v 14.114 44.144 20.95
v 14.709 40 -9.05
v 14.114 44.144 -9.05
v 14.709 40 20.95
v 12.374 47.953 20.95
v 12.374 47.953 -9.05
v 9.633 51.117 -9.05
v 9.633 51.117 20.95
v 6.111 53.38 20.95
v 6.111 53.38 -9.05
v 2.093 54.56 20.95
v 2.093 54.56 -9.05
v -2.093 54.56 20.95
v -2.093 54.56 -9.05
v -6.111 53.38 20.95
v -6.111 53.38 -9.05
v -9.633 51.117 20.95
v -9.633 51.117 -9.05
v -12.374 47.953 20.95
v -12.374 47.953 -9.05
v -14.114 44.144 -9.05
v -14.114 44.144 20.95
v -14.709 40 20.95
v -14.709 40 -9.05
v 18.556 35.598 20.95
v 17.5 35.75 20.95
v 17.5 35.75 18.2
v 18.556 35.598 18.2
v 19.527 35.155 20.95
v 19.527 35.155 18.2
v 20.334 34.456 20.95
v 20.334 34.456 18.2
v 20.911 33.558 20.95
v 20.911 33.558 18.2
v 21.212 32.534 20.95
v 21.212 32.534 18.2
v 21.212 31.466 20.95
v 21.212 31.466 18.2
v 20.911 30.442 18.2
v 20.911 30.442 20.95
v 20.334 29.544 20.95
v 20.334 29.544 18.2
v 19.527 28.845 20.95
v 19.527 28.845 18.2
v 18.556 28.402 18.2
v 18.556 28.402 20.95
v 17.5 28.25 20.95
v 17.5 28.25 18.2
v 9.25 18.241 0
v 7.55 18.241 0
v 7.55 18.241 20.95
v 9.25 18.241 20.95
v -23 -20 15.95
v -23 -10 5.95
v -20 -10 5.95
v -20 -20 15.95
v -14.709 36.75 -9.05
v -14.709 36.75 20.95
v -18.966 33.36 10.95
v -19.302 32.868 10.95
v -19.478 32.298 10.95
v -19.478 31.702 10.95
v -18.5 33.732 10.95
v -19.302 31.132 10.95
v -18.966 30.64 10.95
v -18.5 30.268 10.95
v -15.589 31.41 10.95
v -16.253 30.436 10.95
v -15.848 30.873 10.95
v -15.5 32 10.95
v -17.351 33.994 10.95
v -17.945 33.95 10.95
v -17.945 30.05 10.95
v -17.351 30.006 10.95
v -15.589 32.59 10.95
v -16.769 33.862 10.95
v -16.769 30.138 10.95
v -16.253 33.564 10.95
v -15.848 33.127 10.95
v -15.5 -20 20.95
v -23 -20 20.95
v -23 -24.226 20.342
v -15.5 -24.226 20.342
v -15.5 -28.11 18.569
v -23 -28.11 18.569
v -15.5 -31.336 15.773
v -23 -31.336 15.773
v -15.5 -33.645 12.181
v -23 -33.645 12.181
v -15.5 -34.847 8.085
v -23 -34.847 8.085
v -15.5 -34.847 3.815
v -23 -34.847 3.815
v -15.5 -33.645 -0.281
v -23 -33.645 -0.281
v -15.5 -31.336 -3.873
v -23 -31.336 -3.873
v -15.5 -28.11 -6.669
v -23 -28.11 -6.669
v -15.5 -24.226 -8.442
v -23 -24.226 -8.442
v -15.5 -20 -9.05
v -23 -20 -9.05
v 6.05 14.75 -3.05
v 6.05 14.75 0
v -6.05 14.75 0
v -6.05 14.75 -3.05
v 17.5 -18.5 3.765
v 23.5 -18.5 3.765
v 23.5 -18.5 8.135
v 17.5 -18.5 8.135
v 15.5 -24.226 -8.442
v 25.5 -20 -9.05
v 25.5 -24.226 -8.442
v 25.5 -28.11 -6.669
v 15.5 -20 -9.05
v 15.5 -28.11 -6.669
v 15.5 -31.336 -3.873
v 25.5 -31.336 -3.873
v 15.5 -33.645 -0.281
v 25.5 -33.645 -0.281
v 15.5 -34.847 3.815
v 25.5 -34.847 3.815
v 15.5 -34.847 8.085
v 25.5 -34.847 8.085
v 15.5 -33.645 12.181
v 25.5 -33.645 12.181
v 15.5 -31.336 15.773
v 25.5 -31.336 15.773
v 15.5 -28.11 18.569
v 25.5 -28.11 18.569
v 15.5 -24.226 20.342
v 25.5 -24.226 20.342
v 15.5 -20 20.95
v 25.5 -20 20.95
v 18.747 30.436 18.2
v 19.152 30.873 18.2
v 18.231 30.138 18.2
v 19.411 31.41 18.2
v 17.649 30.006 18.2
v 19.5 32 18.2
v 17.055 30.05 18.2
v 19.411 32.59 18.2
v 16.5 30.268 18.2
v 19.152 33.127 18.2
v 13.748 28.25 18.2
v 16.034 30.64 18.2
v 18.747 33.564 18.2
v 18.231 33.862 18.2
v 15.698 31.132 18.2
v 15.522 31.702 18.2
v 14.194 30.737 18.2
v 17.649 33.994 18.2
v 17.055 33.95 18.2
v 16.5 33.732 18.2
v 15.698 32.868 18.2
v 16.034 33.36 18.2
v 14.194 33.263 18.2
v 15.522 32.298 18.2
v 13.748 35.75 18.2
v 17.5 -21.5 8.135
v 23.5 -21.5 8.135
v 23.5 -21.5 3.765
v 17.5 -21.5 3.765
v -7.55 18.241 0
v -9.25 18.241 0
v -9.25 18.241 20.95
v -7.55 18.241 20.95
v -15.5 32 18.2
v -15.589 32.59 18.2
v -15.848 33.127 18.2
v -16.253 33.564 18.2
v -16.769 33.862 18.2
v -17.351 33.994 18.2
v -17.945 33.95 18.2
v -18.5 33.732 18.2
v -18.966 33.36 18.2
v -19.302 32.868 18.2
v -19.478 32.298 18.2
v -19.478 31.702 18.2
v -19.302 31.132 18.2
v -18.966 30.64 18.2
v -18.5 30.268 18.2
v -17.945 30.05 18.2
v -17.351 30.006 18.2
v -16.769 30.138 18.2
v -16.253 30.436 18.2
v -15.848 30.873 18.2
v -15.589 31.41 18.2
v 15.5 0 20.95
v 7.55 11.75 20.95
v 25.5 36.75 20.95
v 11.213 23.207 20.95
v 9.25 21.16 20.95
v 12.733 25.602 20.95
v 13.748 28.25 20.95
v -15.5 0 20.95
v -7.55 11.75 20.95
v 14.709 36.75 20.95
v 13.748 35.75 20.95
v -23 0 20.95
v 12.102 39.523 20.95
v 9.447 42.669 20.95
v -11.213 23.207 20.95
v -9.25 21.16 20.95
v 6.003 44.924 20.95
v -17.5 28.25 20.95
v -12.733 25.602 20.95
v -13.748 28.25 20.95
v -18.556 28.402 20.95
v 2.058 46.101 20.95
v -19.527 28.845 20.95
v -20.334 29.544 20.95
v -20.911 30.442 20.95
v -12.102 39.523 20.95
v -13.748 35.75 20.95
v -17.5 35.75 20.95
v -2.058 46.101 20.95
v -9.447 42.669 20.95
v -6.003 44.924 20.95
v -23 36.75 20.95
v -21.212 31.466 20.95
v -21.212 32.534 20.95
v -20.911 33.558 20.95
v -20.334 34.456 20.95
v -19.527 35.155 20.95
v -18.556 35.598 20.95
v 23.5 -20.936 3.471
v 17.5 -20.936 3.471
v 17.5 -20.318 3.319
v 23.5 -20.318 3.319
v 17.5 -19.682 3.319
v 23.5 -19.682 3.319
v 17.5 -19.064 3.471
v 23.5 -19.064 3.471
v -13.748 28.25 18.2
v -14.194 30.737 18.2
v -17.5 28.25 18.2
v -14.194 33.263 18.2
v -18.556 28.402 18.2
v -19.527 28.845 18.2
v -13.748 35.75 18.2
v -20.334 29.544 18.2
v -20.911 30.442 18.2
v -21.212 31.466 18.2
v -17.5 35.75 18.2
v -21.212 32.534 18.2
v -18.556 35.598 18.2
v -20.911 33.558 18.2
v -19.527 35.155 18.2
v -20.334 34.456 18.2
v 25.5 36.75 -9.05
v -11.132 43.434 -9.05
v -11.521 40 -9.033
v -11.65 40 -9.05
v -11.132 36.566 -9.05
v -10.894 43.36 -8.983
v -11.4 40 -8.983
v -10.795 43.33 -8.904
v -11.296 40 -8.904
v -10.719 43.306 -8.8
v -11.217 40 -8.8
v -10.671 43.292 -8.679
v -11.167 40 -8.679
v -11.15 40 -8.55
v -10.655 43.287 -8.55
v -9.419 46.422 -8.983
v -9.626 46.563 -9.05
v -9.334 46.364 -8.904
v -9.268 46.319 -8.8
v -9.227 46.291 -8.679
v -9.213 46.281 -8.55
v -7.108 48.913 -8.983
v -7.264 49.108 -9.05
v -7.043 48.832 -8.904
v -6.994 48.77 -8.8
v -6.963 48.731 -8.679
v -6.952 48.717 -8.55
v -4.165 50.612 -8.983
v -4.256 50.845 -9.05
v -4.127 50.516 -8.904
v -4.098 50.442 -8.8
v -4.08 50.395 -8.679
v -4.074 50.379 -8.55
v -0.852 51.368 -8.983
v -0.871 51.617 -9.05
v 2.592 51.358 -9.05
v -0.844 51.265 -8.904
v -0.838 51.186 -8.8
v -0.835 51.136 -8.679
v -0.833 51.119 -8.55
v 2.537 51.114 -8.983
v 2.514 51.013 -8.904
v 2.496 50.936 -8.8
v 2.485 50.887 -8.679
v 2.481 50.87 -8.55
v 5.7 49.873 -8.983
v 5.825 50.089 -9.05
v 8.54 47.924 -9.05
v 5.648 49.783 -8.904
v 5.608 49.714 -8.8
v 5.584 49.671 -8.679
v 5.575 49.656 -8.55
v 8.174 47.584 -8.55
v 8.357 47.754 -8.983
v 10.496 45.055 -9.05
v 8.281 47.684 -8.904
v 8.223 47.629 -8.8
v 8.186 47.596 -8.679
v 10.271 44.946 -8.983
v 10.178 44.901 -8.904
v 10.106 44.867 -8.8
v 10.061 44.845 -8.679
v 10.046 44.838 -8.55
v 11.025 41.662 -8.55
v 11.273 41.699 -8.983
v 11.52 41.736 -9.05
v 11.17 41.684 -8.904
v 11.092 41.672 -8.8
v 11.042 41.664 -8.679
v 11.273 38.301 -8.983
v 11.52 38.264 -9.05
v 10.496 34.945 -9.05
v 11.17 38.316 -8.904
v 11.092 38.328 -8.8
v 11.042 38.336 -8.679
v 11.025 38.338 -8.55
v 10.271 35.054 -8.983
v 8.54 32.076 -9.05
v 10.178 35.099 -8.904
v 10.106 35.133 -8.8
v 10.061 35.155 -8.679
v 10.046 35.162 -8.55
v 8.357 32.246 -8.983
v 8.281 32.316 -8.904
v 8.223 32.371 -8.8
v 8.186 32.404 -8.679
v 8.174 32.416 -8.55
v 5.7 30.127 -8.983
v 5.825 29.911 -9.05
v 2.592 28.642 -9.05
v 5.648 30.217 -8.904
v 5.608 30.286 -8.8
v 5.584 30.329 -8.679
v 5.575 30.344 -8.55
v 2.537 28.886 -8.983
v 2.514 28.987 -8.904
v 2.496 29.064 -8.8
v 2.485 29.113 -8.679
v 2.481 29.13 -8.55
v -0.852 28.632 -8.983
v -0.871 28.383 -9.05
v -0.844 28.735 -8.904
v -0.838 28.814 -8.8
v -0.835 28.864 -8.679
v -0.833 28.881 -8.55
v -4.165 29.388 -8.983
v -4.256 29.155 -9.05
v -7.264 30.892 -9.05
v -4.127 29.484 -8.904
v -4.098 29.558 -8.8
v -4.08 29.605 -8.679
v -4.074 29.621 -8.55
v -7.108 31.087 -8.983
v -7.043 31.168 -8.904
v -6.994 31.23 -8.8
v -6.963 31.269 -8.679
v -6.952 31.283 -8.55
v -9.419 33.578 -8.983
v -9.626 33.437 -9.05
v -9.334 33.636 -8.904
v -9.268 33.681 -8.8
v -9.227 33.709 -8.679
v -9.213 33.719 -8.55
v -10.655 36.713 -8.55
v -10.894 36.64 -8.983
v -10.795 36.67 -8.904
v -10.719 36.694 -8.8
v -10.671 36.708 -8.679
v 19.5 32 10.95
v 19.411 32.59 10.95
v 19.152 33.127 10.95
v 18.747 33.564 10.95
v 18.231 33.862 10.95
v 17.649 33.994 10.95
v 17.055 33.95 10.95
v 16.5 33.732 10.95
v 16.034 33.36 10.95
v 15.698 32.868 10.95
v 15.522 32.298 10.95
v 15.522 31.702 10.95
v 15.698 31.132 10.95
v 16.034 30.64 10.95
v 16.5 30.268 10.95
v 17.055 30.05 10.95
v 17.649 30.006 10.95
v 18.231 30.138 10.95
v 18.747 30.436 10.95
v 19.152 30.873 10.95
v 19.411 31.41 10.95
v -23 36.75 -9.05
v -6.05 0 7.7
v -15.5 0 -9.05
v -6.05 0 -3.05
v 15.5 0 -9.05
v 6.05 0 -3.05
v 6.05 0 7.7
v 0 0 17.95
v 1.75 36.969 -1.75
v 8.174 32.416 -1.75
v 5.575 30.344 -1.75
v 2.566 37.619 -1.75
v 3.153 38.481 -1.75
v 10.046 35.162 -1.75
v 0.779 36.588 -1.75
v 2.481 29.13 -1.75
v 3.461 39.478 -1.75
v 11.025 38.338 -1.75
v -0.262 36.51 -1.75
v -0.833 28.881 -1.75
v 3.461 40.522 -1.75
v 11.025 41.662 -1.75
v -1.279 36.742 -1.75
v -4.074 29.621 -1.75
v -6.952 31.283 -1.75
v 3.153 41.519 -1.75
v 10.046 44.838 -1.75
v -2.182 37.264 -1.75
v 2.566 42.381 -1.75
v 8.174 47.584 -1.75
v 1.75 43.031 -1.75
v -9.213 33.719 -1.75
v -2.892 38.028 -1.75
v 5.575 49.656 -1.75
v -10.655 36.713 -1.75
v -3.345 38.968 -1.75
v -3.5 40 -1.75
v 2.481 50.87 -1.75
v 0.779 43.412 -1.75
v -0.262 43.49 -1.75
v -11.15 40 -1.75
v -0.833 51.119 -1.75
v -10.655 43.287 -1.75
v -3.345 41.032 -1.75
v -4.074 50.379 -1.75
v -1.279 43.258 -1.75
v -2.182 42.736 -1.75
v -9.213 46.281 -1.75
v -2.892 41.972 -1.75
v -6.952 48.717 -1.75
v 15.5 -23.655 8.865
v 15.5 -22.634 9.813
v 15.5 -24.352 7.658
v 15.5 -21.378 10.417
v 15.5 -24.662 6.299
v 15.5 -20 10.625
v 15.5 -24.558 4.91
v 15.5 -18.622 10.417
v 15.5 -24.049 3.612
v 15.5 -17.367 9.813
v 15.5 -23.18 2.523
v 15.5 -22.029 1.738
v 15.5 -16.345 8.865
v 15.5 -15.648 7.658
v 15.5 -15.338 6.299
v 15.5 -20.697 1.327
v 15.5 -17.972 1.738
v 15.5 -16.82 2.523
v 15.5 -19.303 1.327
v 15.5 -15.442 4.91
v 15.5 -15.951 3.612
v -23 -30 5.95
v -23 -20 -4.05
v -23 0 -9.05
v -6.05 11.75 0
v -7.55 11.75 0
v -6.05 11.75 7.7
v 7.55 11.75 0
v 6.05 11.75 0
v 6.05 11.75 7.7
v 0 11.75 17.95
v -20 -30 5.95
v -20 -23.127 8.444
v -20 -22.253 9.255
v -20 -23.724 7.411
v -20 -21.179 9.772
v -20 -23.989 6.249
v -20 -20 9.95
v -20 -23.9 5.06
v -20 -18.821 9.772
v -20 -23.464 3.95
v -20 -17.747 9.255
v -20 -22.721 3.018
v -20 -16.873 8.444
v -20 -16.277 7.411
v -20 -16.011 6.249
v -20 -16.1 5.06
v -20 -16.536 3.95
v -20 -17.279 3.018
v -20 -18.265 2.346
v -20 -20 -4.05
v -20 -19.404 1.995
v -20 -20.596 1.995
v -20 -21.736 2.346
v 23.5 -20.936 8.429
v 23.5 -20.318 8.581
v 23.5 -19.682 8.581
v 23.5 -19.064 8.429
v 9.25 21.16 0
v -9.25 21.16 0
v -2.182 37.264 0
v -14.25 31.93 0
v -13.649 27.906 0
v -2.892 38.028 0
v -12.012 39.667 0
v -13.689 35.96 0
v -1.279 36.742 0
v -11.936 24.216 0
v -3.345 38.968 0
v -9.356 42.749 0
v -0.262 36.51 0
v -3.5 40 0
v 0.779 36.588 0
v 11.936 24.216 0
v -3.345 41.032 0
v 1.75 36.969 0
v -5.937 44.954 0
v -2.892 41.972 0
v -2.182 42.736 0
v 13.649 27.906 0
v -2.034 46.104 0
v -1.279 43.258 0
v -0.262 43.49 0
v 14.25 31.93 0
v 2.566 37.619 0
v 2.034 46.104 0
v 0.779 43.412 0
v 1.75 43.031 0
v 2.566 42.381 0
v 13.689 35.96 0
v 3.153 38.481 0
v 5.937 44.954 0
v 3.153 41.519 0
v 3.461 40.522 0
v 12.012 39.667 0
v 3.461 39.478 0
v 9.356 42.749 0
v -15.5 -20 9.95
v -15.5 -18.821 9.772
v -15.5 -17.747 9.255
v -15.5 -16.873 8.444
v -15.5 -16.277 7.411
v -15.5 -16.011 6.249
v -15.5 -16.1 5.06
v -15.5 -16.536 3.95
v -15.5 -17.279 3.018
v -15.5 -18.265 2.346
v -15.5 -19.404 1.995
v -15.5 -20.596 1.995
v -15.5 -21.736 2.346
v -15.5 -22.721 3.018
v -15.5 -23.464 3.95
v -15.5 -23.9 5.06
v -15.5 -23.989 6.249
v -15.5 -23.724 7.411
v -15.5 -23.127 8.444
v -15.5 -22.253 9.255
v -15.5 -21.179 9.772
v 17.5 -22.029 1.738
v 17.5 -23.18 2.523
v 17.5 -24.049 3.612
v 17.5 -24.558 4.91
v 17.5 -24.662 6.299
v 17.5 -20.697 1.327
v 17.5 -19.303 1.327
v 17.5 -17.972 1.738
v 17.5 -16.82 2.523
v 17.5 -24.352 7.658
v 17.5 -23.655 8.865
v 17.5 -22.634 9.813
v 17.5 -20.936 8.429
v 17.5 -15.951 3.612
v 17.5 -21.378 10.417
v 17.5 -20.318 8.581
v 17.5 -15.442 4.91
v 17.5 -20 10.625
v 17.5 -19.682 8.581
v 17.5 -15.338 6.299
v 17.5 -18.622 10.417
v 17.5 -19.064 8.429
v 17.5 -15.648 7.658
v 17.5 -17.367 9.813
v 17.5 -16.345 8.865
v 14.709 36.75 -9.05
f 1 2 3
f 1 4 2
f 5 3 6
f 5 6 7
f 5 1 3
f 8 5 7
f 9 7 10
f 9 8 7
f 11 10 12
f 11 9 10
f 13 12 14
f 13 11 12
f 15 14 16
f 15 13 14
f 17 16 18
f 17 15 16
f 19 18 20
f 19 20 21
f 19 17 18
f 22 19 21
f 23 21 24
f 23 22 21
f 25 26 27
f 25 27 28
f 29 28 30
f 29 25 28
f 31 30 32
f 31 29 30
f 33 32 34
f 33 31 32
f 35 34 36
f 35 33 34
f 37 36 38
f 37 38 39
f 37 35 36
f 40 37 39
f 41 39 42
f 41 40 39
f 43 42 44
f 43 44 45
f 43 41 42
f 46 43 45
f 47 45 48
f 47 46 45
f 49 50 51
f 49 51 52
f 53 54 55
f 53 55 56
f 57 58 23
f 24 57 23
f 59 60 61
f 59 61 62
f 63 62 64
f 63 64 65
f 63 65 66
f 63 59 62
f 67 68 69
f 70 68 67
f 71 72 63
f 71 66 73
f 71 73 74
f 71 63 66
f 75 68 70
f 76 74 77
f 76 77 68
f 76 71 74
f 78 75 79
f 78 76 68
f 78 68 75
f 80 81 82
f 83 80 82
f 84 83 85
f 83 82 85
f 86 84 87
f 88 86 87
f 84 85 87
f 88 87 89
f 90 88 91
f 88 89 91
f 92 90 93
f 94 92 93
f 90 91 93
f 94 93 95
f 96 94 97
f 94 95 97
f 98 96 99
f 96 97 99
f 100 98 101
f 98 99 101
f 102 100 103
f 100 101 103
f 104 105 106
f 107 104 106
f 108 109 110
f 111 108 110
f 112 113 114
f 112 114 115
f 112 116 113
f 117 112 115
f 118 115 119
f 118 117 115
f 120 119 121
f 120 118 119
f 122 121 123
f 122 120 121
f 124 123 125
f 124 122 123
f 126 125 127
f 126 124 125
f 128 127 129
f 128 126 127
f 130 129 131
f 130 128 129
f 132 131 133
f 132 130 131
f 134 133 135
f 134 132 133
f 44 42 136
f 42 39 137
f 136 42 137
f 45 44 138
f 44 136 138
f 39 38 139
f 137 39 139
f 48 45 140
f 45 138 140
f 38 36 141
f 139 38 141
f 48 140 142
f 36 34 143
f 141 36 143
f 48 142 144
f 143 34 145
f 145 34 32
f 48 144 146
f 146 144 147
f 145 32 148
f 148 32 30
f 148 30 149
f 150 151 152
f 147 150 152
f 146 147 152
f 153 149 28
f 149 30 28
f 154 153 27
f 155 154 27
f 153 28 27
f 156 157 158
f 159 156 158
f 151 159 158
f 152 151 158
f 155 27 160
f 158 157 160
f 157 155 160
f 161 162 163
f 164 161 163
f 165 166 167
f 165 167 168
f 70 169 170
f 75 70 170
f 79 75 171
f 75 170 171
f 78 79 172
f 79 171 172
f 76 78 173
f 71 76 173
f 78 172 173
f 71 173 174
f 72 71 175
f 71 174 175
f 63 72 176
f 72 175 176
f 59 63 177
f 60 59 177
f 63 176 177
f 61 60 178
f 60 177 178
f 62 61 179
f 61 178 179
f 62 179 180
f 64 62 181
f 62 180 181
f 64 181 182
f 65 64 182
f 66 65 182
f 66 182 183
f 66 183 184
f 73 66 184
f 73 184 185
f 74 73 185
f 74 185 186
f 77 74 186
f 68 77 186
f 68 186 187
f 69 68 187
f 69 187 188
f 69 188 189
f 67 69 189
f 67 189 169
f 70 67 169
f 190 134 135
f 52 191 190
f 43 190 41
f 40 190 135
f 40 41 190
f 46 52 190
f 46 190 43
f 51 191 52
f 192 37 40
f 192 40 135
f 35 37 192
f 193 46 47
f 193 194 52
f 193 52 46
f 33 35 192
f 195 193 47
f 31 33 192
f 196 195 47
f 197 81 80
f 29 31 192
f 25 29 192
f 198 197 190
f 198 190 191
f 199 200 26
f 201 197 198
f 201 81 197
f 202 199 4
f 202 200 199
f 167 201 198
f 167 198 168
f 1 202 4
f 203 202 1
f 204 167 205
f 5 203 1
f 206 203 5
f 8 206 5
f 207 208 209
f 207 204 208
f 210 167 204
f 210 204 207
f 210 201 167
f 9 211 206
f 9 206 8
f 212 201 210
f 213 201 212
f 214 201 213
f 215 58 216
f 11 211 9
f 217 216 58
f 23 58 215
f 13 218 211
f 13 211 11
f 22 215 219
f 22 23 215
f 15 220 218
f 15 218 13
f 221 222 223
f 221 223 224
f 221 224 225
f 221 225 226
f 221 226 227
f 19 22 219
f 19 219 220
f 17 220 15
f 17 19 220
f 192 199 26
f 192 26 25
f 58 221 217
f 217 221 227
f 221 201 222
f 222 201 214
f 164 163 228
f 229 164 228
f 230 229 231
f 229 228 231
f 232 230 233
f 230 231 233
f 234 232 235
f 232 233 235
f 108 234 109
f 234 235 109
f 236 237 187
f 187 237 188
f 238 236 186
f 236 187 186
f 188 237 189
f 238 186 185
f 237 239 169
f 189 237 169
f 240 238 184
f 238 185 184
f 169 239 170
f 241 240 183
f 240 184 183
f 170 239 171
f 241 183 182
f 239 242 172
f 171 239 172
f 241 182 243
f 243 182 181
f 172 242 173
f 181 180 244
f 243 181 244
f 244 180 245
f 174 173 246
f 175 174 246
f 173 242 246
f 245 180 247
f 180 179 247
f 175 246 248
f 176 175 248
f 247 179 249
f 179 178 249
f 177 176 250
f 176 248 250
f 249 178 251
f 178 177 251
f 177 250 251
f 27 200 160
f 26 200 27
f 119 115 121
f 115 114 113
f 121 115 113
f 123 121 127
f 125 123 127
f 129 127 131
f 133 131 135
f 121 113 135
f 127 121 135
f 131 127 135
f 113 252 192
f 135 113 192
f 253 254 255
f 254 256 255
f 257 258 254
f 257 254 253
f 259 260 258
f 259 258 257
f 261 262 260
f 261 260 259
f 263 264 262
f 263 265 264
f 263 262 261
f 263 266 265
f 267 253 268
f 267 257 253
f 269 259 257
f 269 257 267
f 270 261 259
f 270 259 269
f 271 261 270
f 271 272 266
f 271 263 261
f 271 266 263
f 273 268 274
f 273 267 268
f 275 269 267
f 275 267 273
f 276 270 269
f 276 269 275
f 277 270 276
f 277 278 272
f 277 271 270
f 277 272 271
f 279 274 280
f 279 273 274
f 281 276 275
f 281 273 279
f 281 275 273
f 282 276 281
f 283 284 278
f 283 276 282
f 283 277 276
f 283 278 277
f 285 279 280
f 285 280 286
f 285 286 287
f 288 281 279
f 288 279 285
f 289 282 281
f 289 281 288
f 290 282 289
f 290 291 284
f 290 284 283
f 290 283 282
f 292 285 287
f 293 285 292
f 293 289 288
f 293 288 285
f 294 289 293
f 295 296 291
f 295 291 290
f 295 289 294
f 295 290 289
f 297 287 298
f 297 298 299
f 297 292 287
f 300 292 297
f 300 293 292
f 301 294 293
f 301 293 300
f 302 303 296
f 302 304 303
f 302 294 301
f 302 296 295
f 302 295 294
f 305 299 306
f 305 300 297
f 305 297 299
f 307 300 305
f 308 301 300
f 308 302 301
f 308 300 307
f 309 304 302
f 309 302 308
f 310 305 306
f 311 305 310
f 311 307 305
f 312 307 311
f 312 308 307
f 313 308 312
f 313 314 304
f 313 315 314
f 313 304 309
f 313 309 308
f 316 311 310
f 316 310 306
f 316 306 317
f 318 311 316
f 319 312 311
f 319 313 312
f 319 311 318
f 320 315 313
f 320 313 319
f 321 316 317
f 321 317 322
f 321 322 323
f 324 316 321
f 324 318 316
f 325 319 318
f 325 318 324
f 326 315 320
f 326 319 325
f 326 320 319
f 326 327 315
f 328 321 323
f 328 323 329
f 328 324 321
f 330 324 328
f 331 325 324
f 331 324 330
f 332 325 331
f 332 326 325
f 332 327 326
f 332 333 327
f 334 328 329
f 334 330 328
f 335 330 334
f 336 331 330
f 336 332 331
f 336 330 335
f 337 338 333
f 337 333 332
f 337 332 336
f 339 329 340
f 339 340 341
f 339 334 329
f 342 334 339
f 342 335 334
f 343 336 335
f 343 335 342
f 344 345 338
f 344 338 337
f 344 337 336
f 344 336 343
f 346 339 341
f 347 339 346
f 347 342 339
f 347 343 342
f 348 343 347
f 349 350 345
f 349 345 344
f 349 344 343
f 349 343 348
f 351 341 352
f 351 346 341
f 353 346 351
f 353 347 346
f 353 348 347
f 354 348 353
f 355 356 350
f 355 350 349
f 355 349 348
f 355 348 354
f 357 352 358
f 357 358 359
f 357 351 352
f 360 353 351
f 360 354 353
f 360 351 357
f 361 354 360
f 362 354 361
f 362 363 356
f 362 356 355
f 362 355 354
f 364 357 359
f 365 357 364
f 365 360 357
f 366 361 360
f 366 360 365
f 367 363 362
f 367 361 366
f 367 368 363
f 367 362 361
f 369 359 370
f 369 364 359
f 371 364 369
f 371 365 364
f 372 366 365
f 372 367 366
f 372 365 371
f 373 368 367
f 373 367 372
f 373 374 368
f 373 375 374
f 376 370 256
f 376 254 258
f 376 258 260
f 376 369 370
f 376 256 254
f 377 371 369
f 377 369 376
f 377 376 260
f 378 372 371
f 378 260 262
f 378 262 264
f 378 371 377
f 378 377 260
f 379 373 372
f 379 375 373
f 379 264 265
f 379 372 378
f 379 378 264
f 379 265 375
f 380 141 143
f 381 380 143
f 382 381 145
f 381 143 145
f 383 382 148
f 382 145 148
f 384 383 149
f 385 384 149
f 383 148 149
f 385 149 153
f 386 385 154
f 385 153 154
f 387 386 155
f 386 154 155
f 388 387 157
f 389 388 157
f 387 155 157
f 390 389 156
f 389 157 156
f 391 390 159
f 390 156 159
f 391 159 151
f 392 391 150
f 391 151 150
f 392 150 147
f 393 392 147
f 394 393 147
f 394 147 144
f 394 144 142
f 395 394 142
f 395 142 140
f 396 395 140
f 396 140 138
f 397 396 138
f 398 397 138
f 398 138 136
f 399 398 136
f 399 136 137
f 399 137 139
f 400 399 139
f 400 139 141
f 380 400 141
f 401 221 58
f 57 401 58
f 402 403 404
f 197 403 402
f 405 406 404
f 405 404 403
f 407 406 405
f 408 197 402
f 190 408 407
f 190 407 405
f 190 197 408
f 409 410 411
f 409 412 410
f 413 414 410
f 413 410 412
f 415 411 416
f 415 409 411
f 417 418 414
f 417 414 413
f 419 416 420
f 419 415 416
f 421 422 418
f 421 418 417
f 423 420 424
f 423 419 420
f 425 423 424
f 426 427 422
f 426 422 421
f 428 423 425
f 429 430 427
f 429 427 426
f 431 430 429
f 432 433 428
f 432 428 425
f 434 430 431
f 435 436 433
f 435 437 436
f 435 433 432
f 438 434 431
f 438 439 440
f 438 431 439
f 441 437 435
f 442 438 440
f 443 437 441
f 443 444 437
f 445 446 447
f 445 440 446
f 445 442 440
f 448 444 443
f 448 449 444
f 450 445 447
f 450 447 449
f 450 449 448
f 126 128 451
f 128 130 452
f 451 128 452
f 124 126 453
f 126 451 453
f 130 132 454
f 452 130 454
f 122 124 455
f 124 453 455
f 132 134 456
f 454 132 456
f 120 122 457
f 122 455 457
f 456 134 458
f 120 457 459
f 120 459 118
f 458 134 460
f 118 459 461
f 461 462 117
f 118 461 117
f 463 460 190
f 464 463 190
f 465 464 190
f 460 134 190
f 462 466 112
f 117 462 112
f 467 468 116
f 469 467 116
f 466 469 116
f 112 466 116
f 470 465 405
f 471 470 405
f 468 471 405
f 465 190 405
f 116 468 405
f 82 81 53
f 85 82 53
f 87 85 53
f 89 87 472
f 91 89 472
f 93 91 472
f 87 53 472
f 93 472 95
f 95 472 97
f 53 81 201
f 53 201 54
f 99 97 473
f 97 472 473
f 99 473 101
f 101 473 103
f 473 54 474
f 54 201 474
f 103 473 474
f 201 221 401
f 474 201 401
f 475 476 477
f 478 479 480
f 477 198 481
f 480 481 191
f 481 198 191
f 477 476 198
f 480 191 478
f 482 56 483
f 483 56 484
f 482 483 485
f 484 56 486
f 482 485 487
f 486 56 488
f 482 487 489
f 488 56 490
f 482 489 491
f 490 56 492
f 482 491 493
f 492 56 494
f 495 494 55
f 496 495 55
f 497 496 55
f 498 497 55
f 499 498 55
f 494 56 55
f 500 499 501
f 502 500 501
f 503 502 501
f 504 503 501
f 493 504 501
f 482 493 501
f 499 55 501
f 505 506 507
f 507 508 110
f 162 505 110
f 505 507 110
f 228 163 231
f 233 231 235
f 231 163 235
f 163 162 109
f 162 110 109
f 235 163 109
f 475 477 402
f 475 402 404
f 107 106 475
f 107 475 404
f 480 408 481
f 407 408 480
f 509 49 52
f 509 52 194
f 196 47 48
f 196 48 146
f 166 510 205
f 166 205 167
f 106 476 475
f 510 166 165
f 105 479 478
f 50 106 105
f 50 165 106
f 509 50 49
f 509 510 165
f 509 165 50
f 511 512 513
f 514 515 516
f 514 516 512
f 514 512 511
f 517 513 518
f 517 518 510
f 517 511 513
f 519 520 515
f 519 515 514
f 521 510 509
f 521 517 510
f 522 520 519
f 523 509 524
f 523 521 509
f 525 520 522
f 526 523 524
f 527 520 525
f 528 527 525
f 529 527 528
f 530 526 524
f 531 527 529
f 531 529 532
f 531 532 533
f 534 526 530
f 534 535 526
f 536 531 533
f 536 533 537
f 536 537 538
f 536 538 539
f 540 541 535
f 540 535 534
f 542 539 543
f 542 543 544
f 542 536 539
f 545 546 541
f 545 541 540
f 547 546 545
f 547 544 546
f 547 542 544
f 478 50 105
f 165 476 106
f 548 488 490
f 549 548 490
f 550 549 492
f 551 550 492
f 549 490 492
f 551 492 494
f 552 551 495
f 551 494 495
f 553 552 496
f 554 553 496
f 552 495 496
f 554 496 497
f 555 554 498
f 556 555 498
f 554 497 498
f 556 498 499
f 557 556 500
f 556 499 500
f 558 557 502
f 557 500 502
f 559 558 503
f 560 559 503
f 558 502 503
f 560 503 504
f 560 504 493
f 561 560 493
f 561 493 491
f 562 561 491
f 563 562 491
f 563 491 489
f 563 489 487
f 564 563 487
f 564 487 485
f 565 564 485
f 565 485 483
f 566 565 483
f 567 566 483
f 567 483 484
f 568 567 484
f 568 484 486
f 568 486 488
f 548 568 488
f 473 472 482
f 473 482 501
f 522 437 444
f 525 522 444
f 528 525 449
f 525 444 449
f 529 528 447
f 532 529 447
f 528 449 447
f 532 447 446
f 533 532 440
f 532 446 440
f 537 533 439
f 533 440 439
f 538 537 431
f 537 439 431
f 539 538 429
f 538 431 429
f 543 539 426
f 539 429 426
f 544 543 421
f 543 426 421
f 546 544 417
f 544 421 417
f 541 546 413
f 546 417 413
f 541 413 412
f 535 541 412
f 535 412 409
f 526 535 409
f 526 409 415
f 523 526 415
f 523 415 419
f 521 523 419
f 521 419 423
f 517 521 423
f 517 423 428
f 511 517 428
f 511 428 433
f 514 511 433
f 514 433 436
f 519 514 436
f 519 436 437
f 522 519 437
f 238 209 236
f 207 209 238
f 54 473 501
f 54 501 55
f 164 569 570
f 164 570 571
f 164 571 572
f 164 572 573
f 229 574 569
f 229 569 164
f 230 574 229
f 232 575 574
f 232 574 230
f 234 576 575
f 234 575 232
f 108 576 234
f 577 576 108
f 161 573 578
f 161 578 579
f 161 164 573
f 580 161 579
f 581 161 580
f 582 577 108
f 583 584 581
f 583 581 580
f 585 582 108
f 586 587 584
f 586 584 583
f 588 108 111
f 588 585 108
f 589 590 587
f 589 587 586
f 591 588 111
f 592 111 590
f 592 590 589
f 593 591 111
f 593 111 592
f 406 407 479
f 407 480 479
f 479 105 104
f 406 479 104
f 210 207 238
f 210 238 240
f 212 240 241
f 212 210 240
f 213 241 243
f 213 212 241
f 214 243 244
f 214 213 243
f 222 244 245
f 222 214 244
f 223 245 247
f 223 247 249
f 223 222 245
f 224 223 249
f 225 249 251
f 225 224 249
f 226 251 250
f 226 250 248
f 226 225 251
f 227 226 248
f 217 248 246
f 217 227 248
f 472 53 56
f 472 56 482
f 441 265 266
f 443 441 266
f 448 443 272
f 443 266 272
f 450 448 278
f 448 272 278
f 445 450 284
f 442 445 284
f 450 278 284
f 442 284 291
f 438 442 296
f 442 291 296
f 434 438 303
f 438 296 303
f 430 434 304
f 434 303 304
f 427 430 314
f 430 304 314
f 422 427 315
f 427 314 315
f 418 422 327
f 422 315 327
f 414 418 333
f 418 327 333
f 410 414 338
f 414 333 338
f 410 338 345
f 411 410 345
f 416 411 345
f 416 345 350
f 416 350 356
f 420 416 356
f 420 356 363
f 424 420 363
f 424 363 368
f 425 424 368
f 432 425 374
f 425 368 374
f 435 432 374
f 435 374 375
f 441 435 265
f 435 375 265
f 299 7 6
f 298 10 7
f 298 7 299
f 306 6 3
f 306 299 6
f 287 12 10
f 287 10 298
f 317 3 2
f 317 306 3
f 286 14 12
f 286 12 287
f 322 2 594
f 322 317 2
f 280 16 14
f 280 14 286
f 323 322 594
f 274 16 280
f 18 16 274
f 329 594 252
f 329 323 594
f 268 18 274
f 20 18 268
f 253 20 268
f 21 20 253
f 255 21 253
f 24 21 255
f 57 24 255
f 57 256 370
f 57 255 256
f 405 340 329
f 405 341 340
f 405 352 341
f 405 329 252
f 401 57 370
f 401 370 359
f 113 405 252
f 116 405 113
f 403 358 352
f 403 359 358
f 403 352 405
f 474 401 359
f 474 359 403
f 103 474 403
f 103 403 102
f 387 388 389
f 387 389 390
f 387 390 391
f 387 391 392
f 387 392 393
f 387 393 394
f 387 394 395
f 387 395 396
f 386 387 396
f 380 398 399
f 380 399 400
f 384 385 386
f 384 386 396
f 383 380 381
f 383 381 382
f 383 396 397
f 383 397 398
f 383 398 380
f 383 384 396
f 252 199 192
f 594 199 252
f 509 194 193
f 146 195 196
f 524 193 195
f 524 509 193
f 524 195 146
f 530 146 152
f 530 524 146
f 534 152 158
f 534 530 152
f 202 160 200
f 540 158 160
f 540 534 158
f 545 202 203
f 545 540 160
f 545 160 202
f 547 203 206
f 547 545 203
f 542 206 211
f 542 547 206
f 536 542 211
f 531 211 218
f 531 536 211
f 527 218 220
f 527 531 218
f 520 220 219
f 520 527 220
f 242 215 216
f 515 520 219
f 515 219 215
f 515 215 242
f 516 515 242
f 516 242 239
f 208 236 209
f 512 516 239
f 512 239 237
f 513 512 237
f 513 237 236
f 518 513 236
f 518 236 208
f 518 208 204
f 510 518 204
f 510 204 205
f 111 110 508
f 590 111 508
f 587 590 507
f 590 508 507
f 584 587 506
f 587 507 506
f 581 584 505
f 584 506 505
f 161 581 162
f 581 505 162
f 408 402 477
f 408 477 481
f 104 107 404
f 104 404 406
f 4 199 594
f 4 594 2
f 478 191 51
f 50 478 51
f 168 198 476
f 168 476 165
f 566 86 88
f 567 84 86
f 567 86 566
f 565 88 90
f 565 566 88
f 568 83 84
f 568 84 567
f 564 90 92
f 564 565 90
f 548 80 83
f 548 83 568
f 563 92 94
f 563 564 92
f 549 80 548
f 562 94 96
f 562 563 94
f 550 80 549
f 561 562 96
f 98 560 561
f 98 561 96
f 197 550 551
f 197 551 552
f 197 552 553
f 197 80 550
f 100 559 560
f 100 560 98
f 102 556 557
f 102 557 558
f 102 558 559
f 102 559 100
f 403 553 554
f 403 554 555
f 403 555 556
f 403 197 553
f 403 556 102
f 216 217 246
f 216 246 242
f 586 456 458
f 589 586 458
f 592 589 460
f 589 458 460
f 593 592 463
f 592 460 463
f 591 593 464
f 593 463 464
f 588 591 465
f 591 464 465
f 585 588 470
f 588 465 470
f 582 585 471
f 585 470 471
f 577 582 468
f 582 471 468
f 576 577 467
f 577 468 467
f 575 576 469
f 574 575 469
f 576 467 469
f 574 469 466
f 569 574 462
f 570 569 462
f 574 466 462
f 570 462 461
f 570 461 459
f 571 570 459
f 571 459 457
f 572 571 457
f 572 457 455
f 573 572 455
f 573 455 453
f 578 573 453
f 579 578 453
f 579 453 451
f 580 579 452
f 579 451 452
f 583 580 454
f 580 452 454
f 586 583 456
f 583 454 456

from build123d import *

# Parameters (mm, degrees)
BOSS_EXTRUDE1_DEPTH     = 20.95
BOSS_EXTRUDE2_DEPTH     = 9.05
SKETCH6_R               = 2
CUT_EXTRUDE2_DEPTH      = 10
CUT_EXTRUDE3_DEPTH      = 2.75
SKETCH8_W               = 8.290514233
SKETCH8_H               = 3.25
CUT_EXTRUDE4_DEPTH      = 1
CUT_EXTRUDE4_DEPTH_BACK = 31
SKETCH11_R              = 11.15
BEARING_HOLE_DEPTH      = 7.3
SKETCH9_W               = 12.1
SKETCH9_H               = 21.5
WIRE_HOLE_DEPTH         = 15.75
SKETCH12_W              = 46
SKETCH12_H              = 30
BOSS_EXTRUDE3_DEPTH     = 0.0001
BOSS_EXTRUDE4_DEPTH     = 7.5
BOSS_EXTRUDE5_DEPTH     = 7.5
BOSS_EXTRUDE9_DEPTH     = 2.5
SKETCH15_R              = 4
CUT_EXTRUDE5_DEPTH      = 49.5
SKETCH17_R              = 6.169612062
BOSS_EXTRUDE6_DEPTH     = 10
SKETCH18_R              = 3.85
BOSS_EXTRUDE7_DEPTH     = 14
SKETCH19_R              = 4.675
CUT_EXTRUDE6_DEPTH      = 2
SKETCH24_R              = 3.5
CUT_EXTRUDE7_DEPTH      = 23.7
FILLET1_R               = 0.5
SKETCH25_W              = 8.843315878
SKETCH25_H              = 4.834346013
BOSS_EXTRUDE10_DEPTH    = 2
SKETCH27_W              = 12.1
SKETCH27_H              = 21.5
CUT_EXTRUDE8_DEPTH      = 50.7501
BOSS_EXTRUDE11_DEPTH    = 14.7501
SKETCH29_W              = 15.1
SKETCH29_H              = 3
CUT_EXTRUDE9_DEPTH      = 20.95
SKETCH30_R              = 4
CUT_EXTRUDE10_DEPTH     = 14
CUT_EXTRUDE11_DEPTH     = 3


with BuildPart() as part:
    # Sketch2 → Boss-Extrude1 (new body)
    with BuildSketch(Plane.XY):
        with BuildLine():
            Line((-14.709485767, 40), (-23, 40))
            Line((-23, 40), (-23, 0))
            Line((-23, 0), (23, 0))
            Line((23, 0), (23, 40))
            Line((23, 40), (14.709485767, 40))
            ThreePointArc((14.709485767, 40), (0, 54.709485767), (-14.709485767, 40))
        make_face()
        with BuildLine():
            Line((-7.55, 18.241114036), (-7.55, 14.75))
            Line((-7.55, 14.75), (7.55, 14.75))
            Line((7.55, 14.75), (7.55, 18.241114036))
            Line((7.55, 18.241114036), (9.25, 18.241114036))
            Line((9.25, 18.241114036), (9.25, 21.160258306))
            ThreePointArc((9.25, 21.160258306), (0, 46.25), (-9.25, 21.160258306))
            Line((-9.25, 21.160258306), (-9.25, 18.241114036))
            Line((-9.25, 18.241114036), (-7.55, 18.241114036))
        make_face(mode=Mode.SUBTRACT)
    extrude(amount=BOSS_EXTRUDE1_DEPTH)

    # Sketch3 → Boss-Extrude2 (add)
    with BuildSketch(Plane.XY):
        with BuildLine():
            Line((-14.709485767, 40), (-23, 40))
            Line((-23, 40), (-23, 0))
            Line((-23, 0), (23, 0))
            Line((23, 0), (23, 40))
            Line((23, 40), (14.709485767, 40))
            ThreePointArc((14.709485767, 40), (0, 54.709485767), (-14.709485767, 40))
        make_face()
    extrude(amount=-BOSS_EXTRUDE2_DEPTH)

    # Sketch6 → Cut-Extrude2 (cut)
    with BuildSketch(Plane.XY.offset(20.95)):
        with Locations((-17.5, 32)):
            Circle(SKETCH6_R)
        with Locations((17.5, 32)):
            Circle(SKETCH6_R)
    extrude(amount=-CUT_EXTRUDE2_DEPTH, mode=Mode.SUBTRACT)

    # Sketch7 → Cut-Extrude3 (cut)
    with BuildSketch(Plane.XY.offset(20.95)):
        with BuildLine():
            Line((-17.5, 35.75), (17.5, 35.75))
            ThreePointArc((17.5, 35.75), (21.25, 32), (17.5, 28.25))
            Line((17.5, 28.25), (-17.5, 28.25))
            ThreePointArc((-17.5, 28.25), (-21.25, 32), (-17.5, 35.75))
        make_face()
    extrude(amount=-CUT_EXTRUDE3_DEPTH, mode=Mode.SUBTRACT)

    # Sketch8 → Cut-Extrude4 (cut, two sides)
    with BuildSketch(Plane.XY.offset(20.95)) as cut_extrude4_sk:
        with Locations((-18.854742884, 38.375)):
            Rectangle(SKETCH8_W, SKETCH8_H)
        with Locations((18.854742884, 38.375)):
            Rectangle(SKETCH8_W, SKETCH8_H)
    extrude(amount=CUT_EXTRUDE4_DEPTH, mode=Mode.SUBTRACT)
    extrude(cut_extrude4_sk.sketch, amount=-CUT_EXTRUDE4_DEPTH_BACK, mode=Mode.SUBTRACT)

    # Sketch11 → Bearing Hole (cut)
    with BuildSketch(Plane(origin=(0, 0, -9.05), x_dir=(-1, 0, 0), z_dir=(0, 0, -1))):
        with Locations((0, 40)):
            Circle(SKETCH11_R)
    extrude(amount=-BEARING_HOLE_DEPTH, mode=Mode.SUBTRACT)

    # Sketch9 → Wire Hole (cut, through all)
    with BuildSketch(Plane(origin=(0, 14.75, -19.25), x_dir=(-1, 0, 0), z_dir=(0, 1, 0))):
        with Locations((0, 26.95)):
            Rectangle(SKETCH9_W, SKETCH9_H)
    extrude(amount=-WIRE_HOLE_DEPTH, mode=Mode.SUBTRACT)

    # Sketch12 → Boss-Extrude3 (add)
    with BuildSketch(Plane.XZ):
        with Locations((0, 5.95)):
            Rectangle(SKETCH12_W, SKETCH12_H)
    extrude(amount=BOSS_EXTRUDE3_DEPTH)

    # Sketch13 → Boss-Extrude4 (add)
    with BuildSketch(Plane(origin=(23, 0, 0), x_dir=(0, 0, -1), z_dir=(1, 0, 0))):
        with BuildLine():
            Line((-20.95, -0.0001), (-20.95, -20.0001))
            ThreePointArc((-20.95, -20.0001), (-5.95, -35.0001), (9.05, -20.0001))
            Line((9.05, -20.0001), (9.05, -0.0001))
            Line((9.05, -0.0001), (-20.95, -0.0001))
        make_face()
    extrude(amount=-BOSS_EXTRUDE4_DEPTH)

    # Sketch14 → Boss-Extrude5 (add)
    with BuildSketch(Plane.ZY.offset(23)):
        with BuildLine():
            Line((-9.05, -20.0001), (-9.05, -0.0001))
            Line((-9.05, -0.0001), (20.95, -0.0001))
            Line((20.95, -0.0001), (20.95, -20.0001))
            ThreePointArc((20.95, -20.0001), (5.95, -35.0001), (-9.05, -20.0001))
        make_face()
    extrude(amount=-BOSS_EXTRUDE5_DEPTH)

    # Sketch21 → Boss-Extrude9 (add)
    with BuildSketch(Plane(origin=(23, 0, 0), x_dir=(0, 0, -1), z_dir=(1, 0, 0))):
        with BuildLine():
            Line((-20.95, -20.0001), (-20.95, 36.75))
            Line((-20.95, 36.75), (9.05, 36.75))
            Line((9.05, 36.75), (9.05, -20.0001))
            ThreePointArc((9.05, -20.0001), (-5.95, -35.0001), (-20.95, -20.0001))
        make_face()
    extrude(amount=BOSS_EXTRUDE9_DEPTH)

    # Sketch15 → Cut-Extrude5 (cut, through all)
    with BuildSketch(Plane.ZY.offset(23)):
        with Locations((5.95, -20.0001)):
            Circle(SKETCH15_R)
    extrude(amount=-CUT_EXTRUDE5_DEPTH, mode=Mode.SUBTRACT)

    # Sketch17 → Boss-Extrude6 (add)
    with BuildSketch(Plane(origin=(25.5, 0, -23), x_dir=(0, 0, 1), z_dir=(-1, 0, 0))):
        with Locations((28.95, -20.0001)):
            Circle(SKETCH17_R)
        with BuildLine():
            Line((26.765394773, -18.5001), (31.134605227, -18.5001))
            ThreePointArc((31.134605227, -18.5001), (31.6, -20.0001), (31.134605227, -21.5001))
            Line((31.134605227, -21.5001), (26.765394773, -21.5001))
            ThreePointArc((26.765394773, -21.5001), (26.3, -20.0001), (26.765394773, -18.5001))
        make_face(mode=Mode.SUBTRACT)
    extrude(amount=BOSS_EXTRUDE6_DEPTH)

    # Sketch19 → Cut-Extrude6 (cut)
    with BuildSketch(Plane.ZY.offset(-15.5)):
        with Locations((5.95, -20.0001)):
            Circle(SKETCH19_R)
    extrude(amount=-CUT_EXTRUDE6_DEPTH, mode=Mode.SUBTRACT)

    # Sketch24 → Cut-Extrude7 (cut, through all)
    with BuildSketch(Plane(origin=(0, 0, -1.75), x_dir=(-1, 0, 0), z_dir=(0, 0, -1))):
        with Locations((0, 40)):
            Circle(SKETCH24_R)
    extrude(amount=-CUT_EXTRUDE7_DEPTH, mode=Mode.SUBTRACT)

    # Fillet1
    fillet1_edges = [part.edges().sort_by_distance(p)[0] for p in [
        (11.15, 40, -9.05),
    ]]
    fillet(fillet1_edges, radius=FILLET1_R)

    # Sketch25 → Boss-Extrude10 (add)
    with BuildSketch(Plane(origin=(25.5, 0, 0), x_dir=(0, 0, -1), z_dir=(1, 0, 0))):
        with Locations((-6.185865257, -20.38943492)):
            Rectangle(SKETCH25_W, SKETCH25_H)
    extrude(amount=-BOSS_EXTRUDE10_DEPTH)

    # Sketch27 → Cut-Extrude8 (cut, through all)
    with BuildSketch(Plane(origin=(0, 14.75, 0), x_dir=(1, 0, 0), z_dir=(0, 1, 0))):
        with Locations((0, -7.7)):
            Rectangle(SKETCH27_W, SKETCH27_H)
    extrude(amount=-CUT_EXTRUDE8_DEPTH, mode=Mode.SUBTRACT)

    # Sketch28 → Boss-Extrude11 (add)
    with BuildSketch(Plane.XZ.offset(0.0001)):
        Polygon((-6.05, 7.7), (0, 17.95), (6.05, 7.7), (6.05, 18.45), (-6.05, 18.45), align=None)
    extrude(amount=-BOSS_EXTRUDE11_DEPTH)

    # Sketch29 → Cut-Extrude9 (cut)
    with BuildSketch(Plane.XY.offset(20.95)):
        with Locations((0, 13.25)):
            Rectangle(SKETCH29_W, SKETCH29_H)
    extrude(amount=-CUT_EXTRUDE9_DEPTH, mode=Mode.SUBTRACT)

    # Sketch31 → Cut-Extrude11 (cut)
    with BuildSketch(Plane.ZY.offset(23)):
        Polygon((5.95, -10.0001), (15.95, -20.0001), (5.95, -30.0001), (-4.05, -20.0001), align=None)
    extrude(amount=-CUT_EXTRUDE11_DEPTH, mode=Mode.SUBTRACT)


with BuildPart() as body_2:
    # Sketch18 → Boss-Extrude7 (new body)
    with BuildSketch(Plane.ZY.offset(23)):
        with Locations((5.95, -20.0001)):
            Circle(SKETCH18_R)
    extrude(amount=-BOSS_EXTRUDE7_DEPTH)

    # Sketch30 → Cut-Extrude10 (cut)
    with BuildSketch(Plane.ZY.offset(23)):
        with Locations((5.95, -20.0001)):
            Circle(SKETCH30_R)
    extrude(amount=-CUT_EXTRUDE10_DEPTH, mode=Mode.SUBTRACT)


solid = part.part
